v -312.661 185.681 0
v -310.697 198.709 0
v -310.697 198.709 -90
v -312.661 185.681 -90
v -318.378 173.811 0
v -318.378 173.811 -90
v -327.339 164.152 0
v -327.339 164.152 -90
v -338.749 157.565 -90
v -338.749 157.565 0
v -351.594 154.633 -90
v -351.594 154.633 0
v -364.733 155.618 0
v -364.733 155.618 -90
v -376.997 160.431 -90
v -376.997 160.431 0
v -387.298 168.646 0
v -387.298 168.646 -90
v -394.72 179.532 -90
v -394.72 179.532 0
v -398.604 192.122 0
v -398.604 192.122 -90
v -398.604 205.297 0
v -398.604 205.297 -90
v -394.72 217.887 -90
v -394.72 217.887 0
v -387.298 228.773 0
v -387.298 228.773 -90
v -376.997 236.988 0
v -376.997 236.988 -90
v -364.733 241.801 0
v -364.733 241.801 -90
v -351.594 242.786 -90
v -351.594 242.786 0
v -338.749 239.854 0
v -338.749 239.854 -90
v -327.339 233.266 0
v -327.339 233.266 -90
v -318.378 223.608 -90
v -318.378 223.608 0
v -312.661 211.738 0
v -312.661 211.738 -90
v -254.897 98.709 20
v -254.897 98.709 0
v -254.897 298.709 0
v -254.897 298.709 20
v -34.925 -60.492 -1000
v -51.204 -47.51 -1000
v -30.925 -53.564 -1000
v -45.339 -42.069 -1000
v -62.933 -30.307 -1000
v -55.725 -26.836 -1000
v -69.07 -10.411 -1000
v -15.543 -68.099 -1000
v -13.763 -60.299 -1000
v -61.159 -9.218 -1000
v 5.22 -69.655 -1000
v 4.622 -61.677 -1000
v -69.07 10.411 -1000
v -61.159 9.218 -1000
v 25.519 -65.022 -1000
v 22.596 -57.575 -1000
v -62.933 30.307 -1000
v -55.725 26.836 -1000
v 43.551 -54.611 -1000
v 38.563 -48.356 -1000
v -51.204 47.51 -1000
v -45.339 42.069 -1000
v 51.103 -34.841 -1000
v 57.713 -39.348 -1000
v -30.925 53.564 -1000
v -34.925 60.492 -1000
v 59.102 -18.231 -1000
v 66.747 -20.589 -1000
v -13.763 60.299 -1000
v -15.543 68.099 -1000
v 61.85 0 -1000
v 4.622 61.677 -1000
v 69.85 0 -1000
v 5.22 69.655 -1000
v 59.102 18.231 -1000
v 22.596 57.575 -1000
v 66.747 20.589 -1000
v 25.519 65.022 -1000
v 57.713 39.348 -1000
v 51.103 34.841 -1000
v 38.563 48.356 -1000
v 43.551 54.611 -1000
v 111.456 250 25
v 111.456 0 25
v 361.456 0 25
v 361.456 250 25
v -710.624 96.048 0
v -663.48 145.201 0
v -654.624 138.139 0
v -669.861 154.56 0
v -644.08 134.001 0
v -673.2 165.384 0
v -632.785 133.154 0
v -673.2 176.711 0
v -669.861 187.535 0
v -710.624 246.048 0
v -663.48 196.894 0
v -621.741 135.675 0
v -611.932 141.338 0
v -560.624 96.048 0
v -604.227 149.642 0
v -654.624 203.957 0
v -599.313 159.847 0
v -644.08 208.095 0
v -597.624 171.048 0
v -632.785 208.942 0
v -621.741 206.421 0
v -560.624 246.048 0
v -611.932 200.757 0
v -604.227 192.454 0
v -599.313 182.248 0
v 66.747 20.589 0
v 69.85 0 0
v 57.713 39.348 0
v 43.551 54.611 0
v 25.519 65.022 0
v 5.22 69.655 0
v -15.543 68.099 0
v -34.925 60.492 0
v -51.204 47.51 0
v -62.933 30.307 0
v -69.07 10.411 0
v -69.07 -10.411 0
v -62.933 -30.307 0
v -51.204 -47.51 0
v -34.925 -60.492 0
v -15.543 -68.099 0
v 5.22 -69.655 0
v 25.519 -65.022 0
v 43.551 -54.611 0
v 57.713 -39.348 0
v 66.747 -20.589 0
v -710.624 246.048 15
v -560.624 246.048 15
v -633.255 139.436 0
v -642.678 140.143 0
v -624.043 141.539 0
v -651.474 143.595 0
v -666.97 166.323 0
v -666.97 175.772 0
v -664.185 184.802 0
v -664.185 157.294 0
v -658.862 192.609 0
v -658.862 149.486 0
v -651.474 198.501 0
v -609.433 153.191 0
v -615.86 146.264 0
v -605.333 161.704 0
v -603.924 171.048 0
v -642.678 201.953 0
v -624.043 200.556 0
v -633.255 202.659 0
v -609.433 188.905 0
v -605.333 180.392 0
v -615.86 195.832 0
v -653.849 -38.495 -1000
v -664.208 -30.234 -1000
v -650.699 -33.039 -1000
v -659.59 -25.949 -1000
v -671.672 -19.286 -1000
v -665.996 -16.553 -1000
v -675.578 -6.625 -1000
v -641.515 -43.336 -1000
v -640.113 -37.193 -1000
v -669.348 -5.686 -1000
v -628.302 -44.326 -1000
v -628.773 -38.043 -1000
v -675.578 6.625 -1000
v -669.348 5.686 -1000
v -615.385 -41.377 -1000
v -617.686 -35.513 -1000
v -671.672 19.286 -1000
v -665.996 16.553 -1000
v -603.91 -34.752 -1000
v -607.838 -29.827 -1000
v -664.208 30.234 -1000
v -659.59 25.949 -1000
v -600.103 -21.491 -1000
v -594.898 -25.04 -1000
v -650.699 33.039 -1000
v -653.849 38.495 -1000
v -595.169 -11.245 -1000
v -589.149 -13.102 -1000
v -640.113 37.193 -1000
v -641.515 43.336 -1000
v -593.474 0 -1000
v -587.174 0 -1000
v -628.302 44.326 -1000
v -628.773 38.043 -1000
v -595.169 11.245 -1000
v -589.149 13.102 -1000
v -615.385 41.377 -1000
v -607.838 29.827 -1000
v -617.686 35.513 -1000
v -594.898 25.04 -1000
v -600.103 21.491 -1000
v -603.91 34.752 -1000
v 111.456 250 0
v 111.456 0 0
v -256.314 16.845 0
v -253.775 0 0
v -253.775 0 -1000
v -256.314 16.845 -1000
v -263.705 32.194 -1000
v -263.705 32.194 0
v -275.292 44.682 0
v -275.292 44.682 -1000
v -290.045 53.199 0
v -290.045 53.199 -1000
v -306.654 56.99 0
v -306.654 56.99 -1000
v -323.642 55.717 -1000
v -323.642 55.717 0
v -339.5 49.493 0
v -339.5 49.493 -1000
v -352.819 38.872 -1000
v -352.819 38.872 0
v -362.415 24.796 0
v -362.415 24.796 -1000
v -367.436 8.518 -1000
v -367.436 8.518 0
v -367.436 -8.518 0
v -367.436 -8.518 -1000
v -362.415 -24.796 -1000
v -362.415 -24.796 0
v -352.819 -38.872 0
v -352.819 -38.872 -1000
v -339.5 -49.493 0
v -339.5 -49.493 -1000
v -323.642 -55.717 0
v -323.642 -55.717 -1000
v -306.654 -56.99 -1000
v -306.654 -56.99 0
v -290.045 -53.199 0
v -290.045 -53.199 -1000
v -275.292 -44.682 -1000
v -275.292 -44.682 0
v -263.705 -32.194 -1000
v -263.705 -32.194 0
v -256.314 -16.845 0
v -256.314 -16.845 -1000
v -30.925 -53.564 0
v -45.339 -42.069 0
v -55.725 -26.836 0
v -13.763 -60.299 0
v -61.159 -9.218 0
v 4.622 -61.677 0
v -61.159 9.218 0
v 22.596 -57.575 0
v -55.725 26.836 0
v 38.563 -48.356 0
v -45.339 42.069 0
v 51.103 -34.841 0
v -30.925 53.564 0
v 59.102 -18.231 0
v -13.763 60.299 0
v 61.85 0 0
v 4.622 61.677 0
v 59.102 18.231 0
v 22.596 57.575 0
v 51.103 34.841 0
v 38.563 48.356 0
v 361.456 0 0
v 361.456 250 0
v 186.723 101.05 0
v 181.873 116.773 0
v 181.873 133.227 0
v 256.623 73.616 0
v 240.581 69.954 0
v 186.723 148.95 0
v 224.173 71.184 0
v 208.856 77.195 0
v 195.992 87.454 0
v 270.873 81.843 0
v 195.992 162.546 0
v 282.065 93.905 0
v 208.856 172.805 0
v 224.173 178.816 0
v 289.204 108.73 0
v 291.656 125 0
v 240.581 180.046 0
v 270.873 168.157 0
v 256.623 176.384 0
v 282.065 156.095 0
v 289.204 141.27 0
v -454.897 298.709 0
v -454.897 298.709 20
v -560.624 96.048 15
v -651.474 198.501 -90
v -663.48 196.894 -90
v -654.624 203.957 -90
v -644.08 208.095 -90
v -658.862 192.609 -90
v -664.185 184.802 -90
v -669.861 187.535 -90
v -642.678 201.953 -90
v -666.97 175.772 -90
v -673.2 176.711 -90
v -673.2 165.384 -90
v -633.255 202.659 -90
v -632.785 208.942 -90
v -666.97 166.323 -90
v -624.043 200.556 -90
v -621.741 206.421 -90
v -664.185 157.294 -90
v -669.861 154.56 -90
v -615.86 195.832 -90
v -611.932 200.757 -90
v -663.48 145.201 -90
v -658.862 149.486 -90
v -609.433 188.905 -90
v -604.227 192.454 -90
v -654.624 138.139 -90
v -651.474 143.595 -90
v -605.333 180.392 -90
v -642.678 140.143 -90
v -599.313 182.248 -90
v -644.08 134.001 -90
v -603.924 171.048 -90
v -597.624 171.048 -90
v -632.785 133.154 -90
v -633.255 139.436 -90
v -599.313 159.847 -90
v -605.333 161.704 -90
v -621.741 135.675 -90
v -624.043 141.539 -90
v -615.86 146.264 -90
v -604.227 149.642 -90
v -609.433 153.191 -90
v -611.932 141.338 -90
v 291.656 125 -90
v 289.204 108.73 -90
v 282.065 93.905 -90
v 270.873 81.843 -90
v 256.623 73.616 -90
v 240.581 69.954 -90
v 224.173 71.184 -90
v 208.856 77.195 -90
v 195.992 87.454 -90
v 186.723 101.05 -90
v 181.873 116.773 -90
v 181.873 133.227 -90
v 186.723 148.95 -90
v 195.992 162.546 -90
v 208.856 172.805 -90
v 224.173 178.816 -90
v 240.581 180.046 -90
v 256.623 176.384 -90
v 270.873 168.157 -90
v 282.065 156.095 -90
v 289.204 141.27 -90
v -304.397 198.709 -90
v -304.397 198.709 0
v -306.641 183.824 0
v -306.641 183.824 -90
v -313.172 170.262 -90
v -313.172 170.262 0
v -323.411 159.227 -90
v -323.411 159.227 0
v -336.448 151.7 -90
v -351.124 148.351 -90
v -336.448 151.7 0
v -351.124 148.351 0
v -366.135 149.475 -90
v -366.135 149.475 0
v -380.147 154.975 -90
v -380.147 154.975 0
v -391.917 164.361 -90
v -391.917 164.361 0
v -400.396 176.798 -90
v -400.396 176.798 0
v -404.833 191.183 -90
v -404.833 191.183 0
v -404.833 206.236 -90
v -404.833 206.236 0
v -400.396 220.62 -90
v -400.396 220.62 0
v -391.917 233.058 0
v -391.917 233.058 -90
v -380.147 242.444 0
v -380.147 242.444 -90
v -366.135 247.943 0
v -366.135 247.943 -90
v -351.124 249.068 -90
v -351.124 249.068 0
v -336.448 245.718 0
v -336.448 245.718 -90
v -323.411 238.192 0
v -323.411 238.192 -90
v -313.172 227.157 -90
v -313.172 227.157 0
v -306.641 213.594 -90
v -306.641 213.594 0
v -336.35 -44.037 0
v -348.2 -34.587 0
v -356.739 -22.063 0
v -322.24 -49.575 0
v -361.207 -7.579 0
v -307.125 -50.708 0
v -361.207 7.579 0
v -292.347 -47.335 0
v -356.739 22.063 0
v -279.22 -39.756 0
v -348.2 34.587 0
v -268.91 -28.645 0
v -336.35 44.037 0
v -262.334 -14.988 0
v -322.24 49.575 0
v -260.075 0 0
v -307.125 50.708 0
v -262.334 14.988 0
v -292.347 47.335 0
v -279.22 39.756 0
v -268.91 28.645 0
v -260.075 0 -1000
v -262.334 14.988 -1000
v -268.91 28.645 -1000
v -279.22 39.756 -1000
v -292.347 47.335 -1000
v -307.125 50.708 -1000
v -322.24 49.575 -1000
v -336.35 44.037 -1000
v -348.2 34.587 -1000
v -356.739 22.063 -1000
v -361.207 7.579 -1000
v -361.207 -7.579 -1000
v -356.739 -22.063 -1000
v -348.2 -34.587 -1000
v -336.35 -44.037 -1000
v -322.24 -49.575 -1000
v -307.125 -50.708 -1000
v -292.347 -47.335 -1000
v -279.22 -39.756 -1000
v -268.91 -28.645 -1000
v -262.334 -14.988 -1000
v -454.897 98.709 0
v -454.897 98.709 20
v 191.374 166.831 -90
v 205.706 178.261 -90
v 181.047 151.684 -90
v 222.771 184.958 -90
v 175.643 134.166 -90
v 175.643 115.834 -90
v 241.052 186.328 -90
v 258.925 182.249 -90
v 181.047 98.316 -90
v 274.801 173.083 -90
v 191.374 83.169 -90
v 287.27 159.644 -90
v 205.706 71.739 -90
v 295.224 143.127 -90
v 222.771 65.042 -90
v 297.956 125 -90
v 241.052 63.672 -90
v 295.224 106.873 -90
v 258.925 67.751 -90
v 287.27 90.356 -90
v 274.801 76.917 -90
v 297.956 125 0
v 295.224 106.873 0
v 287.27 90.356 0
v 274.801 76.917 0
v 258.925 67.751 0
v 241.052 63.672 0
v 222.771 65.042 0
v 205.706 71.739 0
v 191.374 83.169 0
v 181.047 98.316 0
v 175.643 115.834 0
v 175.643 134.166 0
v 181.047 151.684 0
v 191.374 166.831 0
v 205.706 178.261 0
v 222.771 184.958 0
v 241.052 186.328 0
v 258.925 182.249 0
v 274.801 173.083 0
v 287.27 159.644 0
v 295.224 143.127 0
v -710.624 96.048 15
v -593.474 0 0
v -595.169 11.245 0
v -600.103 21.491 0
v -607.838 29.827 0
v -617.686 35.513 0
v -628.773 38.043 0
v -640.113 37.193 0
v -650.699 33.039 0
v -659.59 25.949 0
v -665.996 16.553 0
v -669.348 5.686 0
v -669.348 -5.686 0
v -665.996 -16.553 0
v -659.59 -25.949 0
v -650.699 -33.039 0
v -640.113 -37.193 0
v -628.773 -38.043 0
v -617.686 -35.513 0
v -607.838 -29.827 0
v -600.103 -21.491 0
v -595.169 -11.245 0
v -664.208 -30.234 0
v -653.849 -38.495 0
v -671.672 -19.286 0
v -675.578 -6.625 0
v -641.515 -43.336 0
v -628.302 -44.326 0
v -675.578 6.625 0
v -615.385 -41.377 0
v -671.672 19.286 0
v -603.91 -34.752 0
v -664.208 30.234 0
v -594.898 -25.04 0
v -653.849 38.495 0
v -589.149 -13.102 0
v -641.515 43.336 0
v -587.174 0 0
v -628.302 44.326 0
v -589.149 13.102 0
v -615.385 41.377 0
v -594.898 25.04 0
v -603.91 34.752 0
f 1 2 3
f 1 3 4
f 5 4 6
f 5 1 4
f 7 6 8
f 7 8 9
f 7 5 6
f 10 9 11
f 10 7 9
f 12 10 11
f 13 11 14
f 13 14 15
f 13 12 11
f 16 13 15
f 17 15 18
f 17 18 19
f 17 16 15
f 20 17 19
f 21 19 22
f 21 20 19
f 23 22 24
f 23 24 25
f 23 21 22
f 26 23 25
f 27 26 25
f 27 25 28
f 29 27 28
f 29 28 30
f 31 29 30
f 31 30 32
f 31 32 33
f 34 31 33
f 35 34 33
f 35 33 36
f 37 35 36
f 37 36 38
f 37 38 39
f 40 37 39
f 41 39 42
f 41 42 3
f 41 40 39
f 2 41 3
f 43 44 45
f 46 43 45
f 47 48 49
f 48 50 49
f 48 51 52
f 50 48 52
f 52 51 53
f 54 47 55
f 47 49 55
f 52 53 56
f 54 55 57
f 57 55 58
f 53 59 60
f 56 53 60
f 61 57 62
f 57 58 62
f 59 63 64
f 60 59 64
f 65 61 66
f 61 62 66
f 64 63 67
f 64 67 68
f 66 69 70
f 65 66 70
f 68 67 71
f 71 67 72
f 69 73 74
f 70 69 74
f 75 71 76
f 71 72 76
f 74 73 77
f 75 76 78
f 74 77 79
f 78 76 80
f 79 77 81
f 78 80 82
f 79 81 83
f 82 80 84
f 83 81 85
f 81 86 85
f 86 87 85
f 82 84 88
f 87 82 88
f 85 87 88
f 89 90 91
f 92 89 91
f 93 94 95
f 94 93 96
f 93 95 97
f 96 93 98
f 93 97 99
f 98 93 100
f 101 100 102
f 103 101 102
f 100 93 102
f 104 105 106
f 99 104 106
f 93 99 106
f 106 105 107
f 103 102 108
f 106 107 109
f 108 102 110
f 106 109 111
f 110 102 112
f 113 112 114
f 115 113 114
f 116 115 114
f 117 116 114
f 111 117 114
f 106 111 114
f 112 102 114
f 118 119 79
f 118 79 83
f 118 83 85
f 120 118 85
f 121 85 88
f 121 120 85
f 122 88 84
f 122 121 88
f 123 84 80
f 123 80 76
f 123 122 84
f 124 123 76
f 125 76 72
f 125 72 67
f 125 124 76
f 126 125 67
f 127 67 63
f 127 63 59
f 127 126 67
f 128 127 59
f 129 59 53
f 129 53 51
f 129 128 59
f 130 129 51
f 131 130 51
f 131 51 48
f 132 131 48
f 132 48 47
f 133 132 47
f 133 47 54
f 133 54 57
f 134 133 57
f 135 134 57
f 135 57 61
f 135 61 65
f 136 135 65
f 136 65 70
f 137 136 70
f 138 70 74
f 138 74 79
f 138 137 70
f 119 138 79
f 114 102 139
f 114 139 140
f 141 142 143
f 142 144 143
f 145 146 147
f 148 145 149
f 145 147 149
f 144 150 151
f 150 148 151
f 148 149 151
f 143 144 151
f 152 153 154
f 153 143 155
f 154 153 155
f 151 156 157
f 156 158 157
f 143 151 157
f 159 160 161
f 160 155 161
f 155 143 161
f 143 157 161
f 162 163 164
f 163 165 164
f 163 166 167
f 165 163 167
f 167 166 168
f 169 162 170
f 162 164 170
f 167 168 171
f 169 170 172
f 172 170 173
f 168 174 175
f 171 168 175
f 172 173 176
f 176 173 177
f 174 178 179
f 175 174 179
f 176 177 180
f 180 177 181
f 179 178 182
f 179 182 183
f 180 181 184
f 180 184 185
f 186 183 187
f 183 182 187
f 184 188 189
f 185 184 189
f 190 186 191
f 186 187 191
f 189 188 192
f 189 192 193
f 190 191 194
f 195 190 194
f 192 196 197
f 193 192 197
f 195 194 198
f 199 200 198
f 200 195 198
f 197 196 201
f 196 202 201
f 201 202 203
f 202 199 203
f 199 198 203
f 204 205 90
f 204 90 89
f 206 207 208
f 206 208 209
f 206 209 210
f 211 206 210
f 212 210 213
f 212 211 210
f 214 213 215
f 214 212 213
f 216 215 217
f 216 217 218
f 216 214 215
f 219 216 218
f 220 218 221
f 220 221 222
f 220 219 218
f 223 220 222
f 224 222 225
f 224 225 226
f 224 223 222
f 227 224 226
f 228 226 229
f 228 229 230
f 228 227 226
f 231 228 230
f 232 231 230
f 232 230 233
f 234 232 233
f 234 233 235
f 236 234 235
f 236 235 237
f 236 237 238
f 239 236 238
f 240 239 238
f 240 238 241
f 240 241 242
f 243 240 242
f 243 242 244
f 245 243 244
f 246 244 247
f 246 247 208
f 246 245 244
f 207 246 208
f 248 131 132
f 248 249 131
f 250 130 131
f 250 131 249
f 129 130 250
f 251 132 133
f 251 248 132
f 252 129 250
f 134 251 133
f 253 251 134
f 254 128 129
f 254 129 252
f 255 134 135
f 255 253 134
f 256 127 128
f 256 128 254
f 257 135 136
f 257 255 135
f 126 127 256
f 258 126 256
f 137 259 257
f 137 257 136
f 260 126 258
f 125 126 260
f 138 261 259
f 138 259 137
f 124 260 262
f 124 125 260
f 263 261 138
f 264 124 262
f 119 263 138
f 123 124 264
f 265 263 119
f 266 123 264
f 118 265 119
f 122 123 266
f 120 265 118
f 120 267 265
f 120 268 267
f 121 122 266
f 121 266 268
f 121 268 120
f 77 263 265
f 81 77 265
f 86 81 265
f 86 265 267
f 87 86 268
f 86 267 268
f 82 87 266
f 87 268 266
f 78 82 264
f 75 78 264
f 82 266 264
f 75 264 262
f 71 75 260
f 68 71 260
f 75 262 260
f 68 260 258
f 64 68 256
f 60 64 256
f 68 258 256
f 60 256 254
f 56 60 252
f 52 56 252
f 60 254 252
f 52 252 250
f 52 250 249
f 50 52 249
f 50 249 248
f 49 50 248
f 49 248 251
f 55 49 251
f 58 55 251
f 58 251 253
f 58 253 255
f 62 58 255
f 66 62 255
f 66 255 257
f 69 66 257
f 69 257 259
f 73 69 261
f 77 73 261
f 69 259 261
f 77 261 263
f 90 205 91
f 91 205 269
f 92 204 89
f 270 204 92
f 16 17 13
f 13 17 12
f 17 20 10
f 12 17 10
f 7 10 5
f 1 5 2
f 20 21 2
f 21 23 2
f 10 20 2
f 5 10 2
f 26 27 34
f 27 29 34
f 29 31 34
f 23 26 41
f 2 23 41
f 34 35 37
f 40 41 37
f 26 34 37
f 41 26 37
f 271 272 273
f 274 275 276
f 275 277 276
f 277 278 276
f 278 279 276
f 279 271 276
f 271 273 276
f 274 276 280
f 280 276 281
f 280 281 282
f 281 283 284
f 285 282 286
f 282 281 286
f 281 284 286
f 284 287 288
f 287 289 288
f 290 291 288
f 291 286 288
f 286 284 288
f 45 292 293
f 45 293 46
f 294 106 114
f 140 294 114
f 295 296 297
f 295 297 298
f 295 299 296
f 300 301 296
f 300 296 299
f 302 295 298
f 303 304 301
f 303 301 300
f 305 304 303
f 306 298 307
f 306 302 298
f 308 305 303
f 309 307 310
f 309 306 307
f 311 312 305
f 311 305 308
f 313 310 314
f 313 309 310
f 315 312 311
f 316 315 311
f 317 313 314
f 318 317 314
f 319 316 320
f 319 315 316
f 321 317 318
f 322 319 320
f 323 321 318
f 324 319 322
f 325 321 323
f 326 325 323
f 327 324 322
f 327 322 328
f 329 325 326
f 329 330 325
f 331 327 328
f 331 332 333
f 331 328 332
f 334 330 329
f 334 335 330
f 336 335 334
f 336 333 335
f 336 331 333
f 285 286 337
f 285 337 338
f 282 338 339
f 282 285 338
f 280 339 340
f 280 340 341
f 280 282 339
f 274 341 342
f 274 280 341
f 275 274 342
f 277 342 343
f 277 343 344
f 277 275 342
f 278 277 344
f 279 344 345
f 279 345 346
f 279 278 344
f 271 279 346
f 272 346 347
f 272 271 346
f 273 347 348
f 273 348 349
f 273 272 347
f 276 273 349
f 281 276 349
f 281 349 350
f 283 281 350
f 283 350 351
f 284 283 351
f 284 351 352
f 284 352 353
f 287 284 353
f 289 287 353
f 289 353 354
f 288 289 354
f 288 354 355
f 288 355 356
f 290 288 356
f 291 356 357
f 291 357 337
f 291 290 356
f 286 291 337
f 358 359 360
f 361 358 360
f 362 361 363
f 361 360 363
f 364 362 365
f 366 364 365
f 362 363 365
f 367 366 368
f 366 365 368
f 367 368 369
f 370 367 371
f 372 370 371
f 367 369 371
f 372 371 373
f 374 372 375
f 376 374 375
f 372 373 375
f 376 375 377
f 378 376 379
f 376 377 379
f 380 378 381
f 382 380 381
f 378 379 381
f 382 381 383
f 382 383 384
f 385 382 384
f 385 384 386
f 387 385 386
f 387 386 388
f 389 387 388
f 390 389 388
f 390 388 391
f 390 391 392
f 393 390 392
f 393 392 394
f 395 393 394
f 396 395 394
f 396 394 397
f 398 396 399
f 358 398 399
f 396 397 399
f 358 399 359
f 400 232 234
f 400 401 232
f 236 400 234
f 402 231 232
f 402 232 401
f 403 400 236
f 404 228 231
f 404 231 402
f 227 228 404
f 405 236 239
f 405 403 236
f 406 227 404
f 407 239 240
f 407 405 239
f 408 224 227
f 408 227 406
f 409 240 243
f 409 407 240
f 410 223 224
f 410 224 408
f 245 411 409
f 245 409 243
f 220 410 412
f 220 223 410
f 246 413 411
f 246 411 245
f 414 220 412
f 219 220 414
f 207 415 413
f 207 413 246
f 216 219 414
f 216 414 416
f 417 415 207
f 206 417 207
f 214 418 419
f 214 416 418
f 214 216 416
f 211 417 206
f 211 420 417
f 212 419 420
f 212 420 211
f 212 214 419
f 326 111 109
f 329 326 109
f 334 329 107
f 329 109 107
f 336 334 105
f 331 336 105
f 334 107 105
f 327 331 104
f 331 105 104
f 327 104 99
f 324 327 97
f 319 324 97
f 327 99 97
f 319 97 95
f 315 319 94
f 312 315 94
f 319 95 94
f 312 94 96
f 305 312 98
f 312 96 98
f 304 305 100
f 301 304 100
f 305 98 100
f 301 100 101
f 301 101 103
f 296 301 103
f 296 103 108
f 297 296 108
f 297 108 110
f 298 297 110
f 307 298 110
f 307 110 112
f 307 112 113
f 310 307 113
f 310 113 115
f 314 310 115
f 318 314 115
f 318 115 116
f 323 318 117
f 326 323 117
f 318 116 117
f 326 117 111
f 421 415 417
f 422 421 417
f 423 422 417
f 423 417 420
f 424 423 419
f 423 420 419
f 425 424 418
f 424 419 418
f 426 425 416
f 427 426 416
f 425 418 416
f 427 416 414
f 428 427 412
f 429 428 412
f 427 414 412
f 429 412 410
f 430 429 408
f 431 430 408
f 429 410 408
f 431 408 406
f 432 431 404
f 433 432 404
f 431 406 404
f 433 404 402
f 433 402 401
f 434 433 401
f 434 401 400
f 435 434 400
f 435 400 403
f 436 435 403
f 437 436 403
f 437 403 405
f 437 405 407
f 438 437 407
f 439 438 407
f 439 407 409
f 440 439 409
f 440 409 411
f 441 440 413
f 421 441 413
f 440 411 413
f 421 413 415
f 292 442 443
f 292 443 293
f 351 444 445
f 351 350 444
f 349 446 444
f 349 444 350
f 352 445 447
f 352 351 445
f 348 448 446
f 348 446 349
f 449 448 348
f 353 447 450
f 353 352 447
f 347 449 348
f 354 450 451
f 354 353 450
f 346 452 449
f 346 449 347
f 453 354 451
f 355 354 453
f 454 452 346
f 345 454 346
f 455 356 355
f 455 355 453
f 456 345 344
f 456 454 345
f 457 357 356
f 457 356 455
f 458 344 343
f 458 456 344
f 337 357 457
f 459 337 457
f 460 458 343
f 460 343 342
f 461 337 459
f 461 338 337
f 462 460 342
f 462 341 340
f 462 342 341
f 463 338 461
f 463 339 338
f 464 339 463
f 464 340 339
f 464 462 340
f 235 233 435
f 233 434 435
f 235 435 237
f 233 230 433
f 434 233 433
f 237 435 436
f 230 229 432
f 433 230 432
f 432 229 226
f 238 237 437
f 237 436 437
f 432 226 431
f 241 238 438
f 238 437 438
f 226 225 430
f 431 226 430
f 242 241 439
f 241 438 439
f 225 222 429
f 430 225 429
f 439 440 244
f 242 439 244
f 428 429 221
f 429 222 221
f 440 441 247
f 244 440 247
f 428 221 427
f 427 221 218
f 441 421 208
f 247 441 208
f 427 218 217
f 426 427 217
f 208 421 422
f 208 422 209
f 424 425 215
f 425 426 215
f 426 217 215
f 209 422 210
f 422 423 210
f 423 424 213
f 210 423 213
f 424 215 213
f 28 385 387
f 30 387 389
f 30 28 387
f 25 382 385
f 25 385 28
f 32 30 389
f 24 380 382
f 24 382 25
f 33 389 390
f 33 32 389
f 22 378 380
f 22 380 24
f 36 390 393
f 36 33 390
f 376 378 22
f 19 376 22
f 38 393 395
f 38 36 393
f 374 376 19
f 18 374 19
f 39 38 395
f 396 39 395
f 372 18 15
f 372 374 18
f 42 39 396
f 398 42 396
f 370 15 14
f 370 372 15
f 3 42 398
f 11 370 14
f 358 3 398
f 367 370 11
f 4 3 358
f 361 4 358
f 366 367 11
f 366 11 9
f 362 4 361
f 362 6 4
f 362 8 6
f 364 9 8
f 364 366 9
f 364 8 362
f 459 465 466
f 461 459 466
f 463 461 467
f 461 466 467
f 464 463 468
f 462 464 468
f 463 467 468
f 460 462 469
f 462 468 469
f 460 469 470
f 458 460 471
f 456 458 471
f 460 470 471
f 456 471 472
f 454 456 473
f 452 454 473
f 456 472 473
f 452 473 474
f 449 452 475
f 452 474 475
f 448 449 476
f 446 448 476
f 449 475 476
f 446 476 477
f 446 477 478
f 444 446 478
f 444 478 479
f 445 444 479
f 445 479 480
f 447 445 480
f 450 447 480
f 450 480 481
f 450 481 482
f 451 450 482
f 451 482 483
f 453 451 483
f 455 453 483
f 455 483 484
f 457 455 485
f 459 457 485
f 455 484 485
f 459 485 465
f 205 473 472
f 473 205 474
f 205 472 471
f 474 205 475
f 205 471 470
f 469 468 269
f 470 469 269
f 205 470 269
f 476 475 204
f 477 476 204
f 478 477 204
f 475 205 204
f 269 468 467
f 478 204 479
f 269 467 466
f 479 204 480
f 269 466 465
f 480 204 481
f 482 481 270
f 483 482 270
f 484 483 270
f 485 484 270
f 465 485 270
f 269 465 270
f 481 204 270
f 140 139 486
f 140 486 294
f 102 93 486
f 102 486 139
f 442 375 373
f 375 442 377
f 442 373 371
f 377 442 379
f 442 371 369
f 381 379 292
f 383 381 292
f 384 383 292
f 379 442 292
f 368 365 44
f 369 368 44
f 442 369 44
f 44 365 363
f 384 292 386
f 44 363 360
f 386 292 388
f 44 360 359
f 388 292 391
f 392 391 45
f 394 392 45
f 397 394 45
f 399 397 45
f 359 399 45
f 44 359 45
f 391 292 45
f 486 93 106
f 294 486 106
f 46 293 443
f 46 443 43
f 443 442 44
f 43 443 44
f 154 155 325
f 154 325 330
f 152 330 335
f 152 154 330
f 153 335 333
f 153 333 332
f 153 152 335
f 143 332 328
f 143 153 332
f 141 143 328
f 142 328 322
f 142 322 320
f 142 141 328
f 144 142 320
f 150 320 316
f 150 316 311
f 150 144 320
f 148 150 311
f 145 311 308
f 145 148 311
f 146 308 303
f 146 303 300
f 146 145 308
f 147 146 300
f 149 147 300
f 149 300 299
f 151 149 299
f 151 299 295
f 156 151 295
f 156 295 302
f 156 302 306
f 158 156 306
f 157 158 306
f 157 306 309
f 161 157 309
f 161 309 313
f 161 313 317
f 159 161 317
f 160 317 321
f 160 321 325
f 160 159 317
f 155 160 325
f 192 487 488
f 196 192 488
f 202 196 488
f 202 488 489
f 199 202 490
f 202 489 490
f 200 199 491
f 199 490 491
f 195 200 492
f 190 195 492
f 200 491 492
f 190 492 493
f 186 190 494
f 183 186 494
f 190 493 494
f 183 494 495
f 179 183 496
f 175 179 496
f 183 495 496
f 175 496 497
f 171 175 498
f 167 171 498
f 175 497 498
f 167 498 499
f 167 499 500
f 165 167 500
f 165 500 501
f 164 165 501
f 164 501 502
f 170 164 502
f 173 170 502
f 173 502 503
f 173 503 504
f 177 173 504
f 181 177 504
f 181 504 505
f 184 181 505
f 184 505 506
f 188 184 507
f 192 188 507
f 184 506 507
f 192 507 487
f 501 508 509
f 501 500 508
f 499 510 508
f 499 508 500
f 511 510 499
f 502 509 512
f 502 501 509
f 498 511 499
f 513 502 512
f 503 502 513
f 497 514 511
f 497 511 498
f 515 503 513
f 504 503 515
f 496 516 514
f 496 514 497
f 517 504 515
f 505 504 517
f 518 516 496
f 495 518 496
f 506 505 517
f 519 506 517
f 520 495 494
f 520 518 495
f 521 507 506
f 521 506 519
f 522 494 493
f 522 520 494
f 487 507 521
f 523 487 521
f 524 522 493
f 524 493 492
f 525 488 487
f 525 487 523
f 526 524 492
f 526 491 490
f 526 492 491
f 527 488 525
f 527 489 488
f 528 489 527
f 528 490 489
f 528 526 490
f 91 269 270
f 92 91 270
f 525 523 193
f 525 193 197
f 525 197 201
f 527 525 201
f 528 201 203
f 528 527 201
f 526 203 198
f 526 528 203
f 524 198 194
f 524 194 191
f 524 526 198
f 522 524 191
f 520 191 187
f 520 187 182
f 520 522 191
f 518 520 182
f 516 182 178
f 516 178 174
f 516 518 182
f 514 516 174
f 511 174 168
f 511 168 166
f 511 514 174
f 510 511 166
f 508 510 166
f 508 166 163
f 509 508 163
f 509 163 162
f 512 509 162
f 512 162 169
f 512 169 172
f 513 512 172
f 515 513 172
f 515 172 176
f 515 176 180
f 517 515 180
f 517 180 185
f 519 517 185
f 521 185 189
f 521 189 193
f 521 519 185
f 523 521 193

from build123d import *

# Parameters (mm, degrees)
F0_R      = 69.85
F0_R_2    = 61.85
F1_DEPTH  = 1000
F2_W      = 250
F2_H      = 250
F3_DEPTH  = 25
F4_R      = 57.15
F4_R_2    = 50.85
F5_DEPTH  = 1000
F6_W      = 200
F6_H      = 200
F7_DEPTH  = 20
F8_R      = 50.5
F8_R_2    = 44.2
F9_DEPTH  = 90
F10_R     = 61.5
F10_R_2   = 55.2
F11_DEPTH = 90
F12_R     = 44.45
F12_R_2   = 38.15
F13_DEPTH = 1000
F14_W     = 150
F14_H     = 150
F15_DEPTH = 15
F16_R     = 38
F16_R_2   = 31.7
F17_DEPTH = 90


with BuildPart() as f1:
    # F0 (on Top) → F1 (new body)
    with BuildSketch(Plane.XY):
        Circle(F0_R)
        Circle(F0_R_2, mode=Mode.SUBTRACT)
    extrude(amount=-F1_DEPTH)


with BuildPart() as f3:
    # F2 (on Top) → F3 (new body)
    with BuildSketch(Plane.XY):
        with Locations((236.45629, 125)):
            Rectangle(F2_W, F2_H)
    extrude(amount=F3_DEPTH)

    # F10 (on face) → F11 (join)
    with BuildSketch(Plane(origin=(0, 0, 0), x_dir=(1, 0, 0), z_dir=(0, 0, -1))):
        with Locations((236.45629, -125)):
            Circle(F10_R)
        with Locations((236.45629, -125)):
            Circle(F10_R_2, mode=Mode.SUBTRACT)
    extrude(amount=F11_DEPTH)


with BuildPart() as f5:
    # F4 (on Top) → F5 (new body)
    with BuildSketch(Plane.XY):
        with Locations((-310.924649, 0)):
            Circle(F4_R)
        with Locations((-310.924649, 0)):
            Circle(F4_R_2, mode=Mode.SUBTRACT)
    extrude(amount=-F5_DEPTH)


with BuildPart() as f7:
    # F6 (on Top) → F7 (new body)
    with BuildSketch(Plane.XY):
        with Locations((-354.897445, 198.709337)):
            Rectangle(F6_W, F6_H)
    extrude(amount=F7_DEPTH)

    # F8 (on face) → F9 (join)
    with BuildSketch(Plane(origin=(0, 0, 0), x_dir=(1, 0, 0), z_dir=(0, 0, -1))):
        with Locations((-354.897445, -198.709337)):
            Circle(F8_R)
        with Locations((-354.897445, -198.709337)):
            Circle(F8_R_2, mode=Mode.SUBTRACT)
    extrude(amount=F9_DEPTH)


with BuildPart() as f13:
    # F12 (on Top) → F13 (new body)
    with BuildSketch(Plane.XY):
        with Locations((-631.624103, 0)):
            Circle(F12_R)
        with Locations((-631.624103, 0)):
            Circle(F12_R_2, mode=Mode.SUBTRACT)
    extrude(amount=-F13_DEPTH)


with BuildPart() as f15:
    # F14 (on Top) → F15 (new body)
    with BuildSketch(Plane.XY):
        with Locations((-635.624337, 171.047796)):
            Rectangle(F14_W, F14_H)
    extrude(amount=F15_DEPTH)

    # F16 (on face) → F17 (join)
    with BuildSketch(Plane(origin=(0, 0, 0), x_dir=(1, 0, 0), z_dir=(0, 0, -1))):
        with Locations((-635.624337, -171.047796)):
            Circle(F16_R)
        with Locations((-635.624337, -171.047796)):
            Circle(F16_R_2, mode=Mode.SUBTRACT)
    extrude(amount=F17_DEPTH)


solid = Compound([f1.part, f3.part, f5.part, f7.part, f13.part, f15.part])
